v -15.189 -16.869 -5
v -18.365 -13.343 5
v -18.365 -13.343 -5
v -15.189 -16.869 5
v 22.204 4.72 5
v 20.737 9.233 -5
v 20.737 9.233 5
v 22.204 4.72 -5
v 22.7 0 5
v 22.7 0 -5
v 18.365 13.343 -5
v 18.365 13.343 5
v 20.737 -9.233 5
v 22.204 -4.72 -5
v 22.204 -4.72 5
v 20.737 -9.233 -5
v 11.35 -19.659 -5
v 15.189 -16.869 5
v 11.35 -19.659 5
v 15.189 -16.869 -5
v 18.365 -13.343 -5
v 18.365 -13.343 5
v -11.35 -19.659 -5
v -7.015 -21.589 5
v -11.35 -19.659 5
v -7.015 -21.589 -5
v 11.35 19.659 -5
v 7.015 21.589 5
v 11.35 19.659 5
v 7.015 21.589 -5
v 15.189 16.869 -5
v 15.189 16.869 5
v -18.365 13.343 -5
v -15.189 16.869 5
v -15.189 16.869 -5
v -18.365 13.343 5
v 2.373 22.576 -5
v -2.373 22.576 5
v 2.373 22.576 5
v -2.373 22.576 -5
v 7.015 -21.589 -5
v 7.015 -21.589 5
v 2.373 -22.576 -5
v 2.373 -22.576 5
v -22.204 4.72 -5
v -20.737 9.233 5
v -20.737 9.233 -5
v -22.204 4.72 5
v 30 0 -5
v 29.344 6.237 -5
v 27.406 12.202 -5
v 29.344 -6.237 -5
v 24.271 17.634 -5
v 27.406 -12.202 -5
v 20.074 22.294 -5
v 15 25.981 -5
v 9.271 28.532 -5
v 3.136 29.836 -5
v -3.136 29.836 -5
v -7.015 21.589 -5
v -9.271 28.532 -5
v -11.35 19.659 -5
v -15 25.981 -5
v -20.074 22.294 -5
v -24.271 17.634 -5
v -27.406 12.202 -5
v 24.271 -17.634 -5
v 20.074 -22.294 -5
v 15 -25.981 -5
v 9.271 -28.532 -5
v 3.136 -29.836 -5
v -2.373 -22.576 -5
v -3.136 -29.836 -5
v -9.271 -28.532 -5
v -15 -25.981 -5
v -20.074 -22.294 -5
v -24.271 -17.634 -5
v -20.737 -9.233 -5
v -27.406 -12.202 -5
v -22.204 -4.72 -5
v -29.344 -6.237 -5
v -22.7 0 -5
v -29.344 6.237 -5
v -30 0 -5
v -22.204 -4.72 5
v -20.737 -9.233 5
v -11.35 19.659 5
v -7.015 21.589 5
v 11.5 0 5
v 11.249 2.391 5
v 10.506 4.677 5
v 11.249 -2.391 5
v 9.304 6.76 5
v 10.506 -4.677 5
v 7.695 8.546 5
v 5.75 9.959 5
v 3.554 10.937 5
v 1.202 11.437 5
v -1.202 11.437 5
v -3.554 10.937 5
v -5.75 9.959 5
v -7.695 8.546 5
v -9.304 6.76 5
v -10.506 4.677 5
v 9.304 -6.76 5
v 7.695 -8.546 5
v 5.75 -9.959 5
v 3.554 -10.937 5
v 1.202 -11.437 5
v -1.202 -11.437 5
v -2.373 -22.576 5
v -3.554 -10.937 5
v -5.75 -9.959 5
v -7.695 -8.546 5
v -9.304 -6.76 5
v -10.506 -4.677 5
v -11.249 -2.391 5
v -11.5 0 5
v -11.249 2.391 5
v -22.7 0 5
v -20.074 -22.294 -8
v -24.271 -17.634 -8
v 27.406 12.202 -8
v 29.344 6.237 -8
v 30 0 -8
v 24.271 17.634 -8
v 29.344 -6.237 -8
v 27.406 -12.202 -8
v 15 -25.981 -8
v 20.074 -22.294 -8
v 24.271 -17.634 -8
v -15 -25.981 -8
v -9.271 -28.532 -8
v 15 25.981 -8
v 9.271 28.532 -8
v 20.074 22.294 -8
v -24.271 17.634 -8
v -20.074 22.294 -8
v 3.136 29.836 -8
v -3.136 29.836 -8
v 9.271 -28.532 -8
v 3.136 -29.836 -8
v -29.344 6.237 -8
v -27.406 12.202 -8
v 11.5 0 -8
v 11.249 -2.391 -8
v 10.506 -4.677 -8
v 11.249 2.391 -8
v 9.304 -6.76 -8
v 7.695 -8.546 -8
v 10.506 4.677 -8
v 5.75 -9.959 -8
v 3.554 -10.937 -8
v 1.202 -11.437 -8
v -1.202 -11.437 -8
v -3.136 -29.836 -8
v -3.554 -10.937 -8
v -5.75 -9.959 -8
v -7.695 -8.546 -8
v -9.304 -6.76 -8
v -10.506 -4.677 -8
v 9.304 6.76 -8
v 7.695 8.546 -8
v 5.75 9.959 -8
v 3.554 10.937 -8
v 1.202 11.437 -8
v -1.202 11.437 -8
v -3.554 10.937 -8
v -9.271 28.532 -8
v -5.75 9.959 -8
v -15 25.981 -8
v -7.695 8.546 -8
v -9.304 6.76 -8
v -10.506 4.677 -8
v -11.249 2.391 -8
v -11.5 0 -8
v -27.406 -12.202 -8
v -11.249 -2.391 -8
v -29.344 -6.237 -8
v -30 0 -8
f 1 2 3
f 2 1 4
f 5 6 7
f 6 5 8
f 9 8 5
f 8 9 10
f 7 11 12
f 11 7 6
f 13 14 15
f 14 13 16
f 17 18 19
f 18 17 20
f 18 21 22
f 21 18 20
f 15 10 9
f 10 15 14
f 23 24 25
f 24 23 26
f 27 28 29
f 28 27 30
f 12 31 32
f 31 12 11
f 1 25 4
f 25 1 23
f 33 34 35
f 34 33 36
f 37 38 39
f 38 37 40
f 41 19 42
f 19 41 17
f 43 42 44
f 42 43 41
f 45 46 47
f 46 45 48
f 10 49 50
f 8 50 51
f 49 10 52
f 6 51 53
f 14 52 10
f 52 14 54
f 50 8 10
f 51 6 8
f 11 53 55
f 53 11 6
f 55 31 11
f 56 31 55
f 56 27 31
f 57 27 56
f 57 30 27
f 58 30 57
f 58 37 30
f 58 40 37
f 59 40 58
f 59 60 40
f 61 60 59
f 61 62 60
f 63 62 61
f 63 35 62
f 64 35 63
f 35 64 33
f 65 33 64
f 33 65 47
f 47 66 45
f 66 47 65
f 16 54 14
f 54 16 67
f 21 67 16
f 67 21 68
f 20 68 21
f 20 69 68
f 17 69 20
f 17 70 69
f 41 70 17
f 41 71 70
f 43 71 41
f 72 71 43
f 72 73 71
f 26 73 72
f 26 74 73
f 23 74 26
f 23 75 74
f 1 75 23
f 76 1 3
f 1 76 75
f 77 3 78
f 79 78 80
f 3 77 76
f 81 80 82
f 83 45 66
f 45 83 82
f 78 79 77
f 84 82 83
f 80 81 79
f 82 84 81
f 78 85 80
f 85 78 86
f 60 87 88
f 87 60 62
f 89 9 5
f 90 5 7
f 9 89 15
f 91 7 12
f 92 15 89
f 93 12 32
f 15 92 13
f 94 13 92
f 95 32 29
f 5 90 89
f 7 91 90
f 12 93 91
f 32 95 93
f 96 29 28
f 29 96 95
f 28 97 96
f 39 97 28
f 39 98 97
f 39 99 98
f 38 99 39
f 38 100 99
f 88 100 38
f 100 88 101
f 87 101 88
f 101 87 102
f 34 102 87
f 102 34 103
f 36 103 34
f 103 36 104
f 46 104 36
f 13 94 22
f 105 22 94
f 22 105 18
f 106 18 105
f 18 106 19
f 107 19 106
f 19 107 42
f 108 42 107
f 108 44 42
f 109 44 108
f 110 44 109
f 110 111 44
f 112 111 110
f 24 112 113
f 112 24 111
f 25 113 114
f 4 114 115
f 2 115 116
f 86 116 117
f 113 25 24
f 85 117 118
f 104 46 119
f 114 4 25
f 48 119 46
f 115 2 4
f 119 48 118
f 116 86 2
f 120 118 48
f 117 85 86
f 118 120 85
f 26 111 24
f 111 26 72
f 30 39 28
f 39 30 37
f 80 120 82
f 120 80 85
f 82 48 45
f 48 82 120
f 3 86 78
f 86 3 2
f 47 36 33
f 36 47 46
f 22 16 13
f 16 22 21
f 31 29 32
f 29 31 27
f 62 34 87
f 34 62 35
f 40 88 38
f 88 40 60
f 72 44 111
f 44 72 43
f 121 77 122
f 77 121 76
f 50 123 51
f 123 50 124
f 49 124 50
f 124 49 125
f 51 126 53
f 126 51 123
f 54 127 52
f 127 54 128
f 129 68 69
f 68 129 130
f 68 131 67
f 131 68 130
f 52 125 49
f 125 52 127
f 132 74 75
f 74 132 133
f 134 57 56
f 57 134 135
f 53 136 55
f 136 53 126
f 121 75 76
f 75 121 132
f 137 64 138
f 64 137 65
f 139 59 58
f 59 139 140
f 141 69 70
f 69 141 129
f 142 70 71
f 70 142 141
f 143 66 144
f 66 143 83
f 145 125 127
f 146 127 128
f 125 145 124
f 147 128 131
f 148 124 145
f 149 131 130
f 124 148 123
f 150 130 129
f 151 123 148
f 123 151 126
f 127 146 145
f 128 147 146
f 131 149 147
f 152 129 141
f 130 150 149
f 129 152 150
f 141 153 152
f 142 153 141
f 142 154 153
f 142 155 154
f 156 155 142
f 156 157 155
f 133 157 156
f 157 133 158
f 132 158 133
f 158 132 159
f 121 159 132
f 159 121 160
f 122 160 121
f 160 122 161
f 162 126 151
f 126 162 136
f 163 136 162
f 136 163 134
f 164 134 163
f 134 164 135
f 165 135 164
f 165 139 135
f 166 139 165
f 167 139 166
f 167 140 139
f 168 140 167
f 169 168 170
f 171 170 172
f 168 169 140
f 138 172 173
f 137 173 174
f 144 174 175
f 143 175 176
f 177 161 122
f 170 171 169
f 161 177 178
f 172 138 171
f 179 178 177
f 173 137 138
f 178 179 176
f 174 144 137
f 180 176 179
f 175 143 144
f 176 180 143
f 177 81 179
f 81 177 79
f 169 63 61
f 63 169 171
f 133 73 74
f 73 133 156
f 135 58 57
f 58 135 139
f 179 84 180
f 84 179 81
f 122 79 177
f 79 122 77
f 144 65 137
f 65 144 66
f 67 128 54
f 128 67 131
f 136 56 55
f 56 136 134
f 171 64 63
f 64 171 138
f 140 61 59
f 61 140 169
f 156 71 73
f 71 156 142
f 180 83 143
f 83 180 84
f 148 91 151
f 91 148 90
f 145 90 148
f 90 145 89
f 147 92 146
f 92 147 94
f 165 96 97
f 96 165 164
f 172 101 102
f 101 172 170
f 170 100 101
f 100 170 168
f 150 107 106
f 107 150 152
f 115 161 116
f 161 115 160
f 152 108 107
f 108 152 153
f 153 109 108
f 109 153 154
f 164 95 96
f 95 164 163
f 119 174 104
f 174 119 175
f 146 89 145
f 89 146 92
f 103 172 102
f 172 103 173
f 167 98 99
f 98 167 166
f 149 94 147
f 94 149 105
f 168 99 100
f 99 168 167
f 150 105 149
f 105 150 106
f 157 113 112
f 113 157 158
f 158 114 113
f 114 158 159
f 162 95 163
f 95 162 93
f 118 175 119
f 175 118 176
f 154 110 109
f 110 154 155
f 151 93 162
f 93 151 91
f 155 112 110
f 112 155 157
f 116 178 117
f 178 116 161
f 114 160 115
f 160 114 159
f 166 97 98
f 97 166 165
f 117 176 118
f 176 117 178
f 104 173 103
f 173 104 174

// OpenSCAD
difference()
{
	union ()
	{
		cylinder(10, 22.7, 22.7, center=true);
		translate ([0,0,-8])cylinder(3, 30, 30);
	}
	translate ([0,0,-8]) cylinder (13,11.5,11.5);
}
